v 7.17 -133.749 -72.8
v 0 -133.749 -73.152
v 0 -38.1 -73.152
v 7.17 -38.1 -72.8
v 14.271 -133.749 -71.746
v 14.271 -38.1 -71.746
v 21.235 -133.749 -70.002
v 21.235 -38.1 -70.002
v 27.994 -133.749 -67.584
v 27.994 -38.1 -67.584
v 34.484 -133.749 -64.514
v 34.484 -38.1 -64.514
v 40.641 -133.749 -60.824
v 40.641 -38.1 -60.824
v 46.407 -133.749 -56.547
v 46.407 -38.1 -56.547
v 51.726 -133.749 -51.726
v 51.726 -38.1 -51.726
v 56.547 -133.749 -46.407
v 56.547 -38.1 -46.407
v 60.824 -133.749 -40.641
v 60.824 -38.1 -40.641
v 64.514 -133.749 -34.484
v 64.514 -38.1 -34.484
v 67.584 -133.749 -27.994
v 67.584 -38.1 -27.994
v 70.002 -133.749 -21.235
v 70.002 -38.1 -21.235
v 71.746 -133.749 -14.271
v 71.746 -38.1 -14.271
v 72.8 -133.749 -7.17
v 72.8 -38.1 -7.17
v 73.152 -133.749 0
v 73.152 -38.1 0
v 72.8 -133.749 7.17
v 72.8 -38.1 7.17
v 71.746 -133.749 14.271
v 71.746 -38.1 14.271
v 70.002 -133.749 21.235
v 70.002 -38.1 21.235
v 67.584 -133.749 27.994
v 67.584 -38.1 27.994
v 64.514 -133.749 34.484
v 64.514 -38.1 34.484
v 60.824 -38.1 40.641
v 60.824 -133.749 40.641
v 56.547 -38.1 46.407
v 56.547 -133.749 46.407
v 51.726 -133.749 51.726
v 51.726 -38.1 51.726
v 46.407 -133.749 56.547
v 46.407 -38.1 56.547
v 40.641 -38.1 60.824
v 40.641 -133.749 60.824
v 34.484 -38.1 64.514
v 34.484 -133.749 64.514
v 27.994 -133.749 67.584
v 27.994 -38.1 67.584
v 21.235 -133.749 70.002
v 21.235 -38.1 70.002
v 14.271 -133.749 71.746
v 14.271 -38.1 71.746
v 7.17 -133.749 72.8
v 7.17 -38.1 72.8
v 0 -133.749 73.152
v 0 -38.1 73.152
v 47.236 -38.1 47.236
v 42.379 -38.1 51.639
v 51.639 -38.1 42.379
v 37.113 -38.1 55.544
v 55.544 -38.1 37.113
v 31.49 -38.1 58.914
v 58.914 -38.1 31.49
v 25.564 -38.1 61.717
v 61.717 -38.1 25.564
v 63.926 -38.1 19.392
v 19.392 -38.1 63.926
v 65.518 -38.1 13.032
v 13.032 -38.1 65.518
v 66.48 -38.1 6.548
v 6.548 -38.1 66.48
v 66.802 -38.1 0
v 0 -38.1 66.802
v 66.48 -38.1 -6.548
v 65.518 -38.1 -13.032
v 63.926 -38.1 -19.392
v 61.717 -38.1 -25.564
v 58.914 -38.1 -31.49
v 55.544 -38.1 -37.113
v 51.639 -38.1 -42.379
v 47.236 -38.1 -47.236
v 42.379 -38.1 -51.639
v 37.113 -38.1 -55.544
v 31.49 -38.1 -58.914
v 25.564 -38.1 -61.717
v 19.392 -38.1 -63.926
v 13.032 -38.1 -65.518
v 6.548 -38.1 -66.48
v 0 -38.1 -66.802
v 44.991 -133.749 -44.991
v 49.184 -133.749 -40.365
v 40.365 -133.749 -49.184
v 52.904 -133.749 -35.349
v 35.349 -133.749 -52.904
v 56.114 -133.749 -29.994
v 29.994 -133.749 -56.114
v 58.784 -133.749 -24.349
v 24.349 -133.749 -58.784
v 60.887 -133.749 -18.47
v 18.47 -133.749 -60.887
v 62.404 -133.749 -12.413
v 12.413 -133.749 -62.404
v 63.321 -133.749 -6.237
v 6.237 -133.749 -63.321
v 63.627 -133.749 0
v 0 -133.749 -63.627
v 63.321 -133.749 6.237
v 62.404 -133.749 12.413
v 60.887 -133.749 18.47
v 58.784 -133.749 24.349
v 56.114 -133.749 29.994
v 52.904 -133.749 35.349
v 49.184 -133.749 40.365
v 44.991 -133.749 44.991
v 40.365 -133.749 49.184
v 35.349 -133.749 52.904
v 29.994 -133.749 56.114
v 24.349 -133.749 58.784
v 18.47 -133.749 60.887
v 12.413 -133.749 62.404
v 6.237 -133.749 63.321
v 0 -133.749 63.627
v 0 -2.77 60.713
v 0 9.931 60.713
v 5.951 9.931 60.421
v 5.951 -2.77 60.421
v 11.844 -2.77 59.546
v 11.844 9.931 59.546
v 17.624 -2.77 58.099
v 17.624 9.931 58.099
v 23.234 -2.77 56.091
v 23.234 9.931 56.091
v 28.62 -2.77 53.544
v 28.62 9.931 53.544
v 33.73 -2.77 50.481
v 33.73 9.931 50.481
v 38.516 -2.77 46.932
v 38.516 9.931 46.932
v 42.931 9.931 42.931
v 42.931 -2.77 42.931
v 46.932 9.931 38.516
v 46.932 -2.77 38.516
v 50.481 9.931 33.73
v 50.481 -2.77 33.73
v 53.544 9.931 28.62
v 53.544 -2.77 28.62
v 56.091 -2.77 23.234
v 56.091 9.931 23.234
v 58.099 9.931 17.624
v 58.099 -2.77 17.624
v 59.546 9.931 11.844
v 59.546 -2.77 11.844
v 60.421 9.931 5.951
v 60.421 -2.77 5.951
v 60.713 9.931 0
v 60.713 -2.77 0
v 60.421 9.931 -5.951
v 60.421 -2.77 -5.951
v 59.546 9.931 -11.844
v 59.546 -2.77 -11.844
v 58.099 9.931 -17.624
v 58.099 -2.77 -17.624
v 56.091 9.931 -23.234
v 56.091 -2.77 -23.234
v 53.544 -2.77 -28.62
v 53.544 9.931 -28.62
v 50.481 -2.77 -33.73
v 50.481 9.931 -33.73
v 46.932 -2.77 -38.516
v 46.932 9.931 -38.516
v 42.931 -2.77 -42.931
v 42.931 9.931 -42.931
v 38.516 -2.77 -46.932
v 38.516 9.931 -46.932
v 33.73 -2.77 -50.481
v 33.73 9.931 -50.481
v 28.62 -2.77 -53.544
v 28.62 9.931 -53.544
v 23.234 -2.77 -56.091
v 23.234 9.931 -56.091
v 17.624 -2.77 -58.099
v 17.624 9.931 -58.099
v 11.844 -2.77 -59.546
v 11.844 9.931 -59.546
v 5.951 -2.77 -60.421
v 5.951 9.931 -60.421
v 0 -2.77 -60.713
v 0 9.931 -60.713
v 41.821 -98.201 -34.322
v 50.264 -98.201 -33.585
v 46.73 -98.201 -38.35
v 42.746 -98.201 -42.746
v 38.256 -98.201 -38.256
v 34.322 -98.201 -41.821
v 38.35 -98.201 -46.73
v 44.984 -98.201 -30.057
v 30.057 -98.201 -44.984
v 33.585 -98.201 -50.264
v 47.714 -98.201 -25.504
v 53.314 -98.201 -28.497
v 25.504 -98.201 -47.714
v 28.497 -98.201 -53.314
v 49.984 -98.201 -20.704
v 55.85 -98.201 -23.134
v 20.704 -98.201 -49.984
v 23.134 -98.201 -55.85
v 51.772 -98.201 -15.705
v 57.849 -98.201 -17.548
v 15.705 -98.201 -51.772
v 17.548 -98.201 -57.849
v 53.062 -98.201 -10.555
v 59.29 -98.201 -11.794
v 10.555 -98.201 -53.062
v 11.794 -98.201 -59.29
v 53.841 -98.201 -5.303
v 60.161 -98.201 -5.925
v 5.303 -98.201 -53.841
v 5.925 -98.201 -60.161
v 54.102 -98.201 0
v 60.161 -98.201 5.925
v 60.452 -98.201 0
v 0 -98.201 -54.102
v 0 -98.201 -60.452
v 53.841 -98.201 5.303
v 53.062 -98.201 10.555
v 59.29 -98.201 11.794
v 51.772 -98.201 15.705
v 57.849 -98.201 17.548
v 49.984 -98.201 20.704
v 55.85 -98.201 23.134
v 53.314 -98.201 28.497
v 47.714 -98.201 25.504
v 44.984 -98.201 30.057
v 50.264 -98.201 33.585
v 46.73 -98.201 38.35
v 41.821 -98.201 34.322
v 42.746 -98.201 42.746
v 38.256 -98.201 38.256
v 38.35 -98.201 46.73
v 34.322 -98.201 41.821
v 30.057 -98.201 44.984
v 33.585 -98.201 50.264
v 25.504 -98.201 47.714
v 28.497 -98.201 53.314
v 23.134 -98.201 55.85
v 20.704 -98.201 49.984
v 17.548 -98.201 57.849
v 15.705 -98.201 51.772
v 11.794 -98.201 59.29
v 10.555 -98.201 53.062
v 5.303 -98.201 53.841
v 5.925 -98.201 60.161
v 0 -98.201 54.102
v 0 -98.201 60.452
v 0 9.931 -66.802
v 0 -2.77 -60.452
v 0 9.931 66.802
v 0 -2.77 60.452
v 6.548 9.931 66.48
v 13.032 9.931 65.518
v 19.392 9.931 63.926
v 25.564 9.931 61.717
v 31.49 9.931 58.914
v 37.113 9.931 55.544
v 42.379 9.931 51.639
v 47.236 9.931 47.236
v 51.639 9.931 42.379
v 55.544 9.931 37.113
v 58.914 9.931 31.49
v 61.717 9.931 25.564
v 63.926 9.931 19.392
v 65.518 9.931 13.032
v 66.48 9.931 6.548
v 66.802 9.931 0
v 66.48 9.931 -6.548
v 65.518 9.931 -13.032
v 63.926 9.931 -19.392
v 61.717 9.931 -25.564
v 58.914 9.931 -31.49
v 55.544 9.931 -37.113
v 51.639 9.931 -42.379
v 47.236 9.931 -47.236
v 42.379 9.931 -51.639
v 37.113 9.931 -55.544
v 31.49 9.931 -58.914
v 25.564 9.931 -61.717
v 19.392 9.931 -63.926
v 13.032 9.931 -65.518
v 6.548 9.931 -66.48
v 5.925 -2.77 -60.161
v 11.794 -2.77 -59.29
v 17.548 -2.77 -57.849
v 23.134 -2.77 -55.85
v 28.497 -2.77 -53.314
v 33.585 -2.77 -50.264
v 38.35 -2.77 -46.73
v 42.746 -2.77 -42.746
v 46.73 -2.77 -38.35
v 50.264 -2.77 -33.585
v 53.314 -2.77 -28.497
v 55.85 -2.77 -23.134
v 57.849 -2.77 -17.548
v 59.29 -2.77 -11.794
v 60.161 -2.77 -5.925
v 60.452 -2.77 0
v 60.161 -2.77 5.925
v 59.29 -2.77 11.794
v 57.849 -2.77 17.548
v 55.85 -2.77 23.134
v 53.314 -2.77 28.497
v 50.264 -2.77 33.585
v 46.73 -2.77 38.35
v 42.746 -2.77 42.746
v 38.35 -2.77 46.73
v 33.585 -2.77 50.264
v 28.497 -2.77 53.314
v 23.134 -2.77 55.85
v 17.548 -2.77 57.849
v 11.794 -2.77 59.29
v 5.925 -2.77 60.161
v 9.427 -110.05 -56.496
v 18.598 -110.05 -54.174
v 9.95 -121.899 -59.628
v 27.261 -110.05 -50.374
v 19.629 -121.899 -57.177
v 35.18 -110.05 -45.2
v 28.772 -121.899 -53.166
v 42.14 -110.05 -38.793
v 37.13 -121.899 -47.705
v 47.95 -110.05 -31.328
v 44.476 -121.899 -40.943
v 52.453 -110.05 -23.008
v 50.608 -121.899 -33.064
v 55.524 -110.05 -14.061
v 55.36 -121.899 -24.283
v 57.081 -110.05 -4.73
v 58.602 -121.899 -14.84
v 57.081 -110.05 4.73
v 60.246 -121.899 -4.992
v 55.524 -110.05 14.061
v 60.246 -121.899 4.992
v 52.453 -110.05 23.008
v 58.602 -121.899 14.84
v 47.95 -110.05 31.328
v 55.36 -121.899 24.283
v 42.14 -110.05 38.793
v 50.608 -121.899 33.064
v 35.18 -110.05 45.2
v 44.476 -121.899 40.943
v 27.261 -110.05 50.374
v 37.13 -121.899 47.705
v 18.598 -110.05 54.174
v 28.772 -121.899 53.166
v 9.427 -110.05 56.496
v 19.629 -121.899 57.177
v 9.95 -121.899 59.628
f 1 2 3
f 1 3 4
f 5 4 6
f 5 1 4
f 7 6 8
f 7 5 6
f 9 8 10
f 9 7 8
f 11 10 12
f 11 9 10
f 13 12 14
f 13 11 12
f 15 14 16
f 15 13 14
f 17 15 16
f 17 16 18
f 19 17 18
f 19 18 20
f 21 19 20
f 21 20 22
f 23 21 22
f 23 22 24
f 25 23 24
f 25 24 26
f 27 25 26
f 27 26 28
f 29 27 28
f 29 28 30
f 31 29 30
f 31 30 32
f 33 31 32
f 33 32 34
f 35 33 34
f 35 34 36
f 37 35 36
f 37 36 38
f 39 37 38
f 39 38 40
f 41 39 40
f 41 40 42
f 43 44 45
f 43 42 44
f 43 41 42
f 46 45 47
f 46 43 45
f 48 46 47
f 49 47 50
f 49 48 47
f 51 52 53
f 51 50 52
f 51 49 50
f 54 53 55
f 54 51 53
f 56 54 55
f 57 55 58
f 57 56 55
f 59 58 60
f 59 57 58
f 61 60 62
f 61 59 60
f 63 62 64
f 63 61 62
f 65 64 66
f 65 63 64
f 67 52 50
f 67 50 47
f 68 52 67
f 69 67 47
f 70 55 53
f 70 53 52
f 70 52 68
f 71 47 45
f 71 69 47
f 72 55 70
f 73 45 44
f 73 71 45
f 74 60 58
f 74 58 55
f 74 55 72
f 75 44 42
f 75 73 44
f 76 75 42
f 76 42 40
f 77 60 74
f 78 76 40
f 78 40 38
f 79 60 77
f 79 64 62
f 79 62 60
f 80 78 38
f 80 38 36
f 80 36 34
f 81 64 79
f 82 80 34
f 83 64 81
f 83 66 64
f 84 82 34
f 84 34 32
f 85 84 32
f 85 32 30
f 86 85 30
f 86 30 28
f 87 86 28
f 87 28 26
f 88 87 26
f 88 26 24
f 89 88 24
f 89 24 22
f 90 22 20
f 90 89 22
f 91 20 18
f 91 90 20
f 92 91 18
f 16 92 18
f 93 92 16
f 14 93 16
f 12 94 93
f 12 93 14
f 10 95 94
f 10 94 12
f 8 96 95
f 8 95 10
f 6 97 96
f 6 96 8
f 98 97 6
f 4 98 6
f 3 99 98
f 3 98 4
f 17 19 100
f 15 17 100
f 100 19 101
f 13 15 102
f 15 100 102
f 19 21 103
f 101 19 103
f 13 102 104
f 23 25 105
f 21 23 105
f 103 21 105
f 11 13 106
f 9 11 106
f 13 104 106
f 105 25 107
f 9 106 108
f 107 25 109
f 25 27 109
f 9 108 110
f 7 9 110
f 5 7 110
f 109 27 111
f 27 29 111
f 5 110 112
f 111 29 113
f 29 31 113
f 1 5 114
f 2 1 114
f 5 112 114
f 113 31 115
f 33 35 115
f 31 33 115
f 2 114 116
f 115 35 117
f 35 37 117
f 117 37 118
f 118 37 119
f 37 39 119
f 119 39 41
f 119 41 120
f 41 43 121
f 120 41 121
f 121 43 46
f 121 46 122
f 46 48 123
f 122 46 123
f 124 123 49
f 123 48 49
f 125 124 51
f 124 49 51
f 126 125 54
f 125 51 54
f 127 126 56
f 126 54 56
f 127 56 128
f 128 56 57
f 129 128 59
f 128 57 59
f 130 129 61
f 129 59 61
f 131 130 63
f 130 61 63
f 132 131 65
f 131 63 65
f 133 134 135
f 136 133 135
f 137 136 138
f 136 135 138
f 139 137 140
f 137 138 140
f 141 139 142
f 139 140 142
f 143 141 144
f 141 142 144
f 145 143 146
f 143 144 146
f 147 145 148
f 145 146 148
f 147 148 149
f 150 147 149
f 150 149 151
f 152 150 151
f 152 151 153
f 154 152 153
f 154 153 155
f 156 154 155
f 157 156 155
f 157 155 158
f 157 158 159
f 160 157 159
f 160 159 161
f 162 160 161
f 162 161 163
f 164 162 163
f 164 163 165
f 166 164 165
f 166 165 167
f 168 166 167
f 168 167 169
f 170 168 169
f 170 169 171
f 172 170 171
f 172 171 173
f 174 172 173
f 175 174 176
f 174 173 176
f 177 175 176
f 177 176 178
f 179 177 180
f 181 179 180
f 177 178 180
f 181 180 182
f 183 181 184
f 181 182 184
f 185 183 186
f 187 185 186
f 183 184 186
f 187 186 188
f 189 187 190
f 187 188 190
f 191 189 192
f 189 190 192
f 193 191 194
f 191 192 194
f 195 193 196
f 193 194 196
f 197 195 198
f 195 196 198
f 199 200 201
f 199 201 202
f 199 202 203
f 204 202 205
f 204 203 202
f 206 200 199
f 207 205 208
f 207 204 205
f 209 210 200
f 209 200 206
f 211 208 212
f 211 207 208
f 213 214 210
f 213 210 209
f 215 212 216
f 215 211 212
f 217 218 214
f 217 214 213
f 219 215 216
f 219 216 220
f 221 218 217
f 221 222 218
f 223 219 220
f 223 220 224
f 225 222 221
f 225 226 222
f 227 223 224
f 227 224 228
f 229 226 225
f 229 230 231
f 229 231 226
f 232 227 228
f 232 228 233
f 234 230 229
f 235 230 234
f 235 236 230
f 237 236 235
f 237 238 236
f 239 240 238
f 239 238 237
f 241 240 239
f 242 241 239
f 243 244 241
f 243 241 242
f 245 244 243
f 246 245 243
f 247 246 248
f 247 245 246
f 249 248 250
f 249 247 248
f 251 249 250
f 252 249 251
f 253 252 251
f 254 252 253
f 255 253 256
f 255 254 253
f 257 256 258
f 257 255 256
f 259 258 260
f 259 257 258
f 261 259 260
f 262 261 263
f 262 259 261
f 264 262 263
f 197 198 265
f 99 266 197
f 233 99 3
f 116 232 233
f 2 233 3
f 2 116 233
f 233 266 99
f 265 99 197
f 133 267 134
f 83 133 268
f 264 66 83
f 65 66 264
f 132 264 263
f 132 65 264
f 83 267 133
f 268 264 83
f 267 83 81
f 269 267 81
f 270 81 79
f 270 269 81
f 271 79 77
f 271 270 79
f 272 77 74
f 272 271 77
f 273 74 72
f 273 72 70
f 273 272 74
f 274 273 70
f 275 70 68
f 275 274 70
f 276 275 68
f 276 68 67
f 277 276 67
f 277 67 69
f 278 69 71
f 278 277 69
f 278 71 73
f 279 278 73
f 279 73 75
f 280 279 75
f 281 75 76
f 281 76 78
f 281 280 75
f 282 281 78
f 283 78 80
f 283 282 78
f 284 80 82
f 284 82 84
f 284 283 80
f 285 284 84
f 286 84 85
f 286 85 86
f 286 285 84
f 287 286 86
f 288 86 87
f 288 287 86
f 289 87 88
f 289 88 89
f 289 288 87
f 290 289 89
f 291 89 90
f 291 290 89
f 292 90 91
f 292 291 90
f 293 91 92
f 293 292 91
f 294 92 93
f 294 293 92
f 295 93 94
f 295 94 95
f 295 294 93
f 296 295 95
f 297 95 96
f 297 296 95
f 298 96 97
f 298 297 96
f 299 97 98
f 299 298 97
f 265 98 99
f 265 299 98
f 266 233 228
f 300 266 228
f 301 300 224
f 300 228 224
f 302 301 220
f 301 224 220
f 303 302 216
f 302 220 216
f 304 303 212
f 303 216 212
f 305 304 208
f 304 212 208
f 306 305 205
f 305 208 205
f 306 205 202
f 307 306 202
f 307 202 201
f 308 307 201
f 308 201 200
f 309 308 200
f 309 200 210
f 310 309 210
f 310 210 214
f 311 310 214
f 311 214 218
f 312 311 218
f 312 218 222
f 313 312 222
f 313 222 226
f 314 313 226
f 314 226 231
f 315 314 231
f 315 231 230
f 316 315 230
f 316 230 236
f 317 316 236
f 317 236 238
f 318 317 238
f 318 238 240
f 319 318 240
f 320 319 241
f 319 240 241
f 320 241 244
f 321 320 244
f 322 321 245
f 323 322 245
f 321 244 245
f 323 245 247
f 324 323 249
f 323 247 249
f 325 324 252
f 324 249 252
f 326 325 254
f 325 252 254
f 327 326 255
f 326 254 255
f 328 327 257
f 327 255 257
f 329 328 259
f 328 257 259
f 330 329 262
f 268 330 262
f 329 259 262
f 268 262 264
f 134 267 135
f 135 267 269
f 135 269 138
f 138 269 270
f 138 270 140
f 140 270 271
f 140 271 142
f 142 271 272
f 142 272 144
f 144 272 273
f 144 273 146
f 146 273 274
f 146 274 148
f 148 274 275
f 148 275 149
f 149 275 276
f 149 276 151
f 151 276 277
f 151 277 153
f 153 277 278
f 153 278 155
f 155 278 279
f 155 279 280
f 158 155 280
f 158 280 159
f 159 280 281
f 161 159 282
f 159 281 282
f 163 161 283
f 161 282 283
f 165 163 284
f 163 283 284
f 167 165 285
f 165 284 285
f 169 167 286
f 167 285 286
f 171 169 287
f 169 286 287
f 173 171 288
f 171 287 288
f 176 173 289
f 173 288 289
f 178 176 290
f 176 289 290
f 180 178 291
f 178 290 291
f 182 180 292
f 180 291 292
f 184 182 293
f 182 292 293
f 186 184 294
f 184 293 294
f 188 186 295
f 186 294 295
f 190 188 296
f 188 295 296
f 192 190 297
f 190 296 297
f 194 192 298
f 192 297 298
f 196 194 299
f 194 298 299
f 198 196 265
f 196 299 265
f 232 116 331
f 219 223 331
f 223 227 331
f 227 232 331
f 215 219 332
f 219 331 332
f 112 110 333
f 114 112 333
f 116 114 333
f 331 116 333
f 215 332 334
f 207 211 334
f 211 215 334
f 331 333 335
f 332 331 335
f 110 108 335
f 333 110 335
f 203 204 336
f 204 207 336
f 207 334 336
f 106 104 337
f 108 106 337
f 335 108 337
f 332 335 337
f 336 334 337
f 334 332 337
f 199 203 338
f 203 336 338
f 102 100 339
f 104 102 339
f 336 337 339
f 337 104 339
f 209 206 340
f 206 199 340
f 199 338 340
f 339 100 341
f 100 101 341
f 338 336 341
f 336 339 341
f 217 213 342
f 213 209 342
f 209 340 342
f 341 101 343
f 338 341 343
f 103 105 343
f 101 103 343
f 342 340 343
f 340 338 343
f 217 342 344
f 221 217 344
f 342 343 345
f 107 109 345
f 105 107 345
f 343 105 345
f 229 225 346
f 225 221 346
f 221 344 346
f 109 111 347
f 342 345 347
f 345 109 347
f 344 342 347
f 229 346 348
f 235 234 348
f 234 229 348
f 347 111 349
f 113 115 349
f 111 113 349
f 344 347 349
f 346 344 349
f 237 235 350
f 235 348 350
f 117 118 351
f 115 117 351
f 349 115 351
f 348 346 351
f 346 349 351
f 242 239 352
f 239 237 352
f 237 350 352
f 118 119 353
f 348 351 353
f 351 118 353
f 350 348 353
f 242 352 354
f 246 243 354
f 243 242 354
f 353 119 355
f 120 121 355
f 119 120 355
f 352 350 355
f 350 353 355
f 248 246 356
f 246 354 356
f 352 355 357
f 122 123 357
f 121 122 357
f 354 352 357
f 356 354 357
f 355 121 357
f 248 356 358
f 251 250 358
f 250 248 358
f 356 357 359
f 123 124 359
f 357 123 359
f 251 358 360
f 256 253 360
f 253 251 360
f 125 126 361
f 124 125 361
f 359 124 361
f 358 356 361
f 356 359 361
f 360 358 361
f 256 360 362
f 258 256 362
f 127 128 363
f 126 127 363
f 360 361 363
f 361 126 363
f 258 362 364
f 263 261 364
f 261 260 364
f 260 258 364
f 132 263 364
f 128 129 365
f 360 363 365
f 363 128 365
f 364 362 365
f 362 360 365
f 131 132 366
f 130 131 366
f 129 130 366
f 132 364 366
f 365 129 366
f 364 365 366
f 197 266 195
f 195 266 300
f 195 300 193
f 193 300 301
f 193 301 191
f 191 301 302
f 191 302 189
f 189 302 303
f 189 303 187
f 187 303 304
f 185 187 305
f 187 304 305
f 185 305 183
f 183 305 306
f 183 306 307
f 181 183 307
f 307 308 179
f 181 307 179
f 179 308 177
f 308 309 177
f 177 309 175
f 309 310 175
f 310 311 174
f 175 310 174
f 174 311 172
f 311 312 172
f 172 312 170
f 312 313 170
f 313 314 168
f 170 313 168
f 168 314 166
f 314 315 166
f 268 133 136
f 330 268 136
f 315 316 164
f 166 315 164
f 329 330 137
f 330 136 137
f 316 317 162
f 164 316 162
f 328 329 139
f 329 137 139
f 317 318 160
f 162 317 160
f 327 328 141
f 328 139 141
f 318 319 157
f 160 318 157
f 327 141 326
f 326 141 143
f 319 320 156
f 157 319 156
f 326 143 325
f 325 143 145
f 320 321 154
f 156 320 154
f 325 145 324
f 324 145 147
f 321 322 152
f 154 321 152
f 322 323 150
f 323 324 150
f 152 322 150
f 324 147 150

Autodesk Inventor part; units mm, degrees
ref_plane "YZ Plane" through (0, 0, 0) normal (1, 0, 0) x (0, 1, 0)
ref_plane "XZ Plane" through (0, 0, 0) normal (0, 1, 0) x (-1, 0, 0)
ref_plane "XY Plane" through (0, 0, 0) normal (0, 0, 1) x (1, 0, 0)
sketch "Sketch1" plane through (0, 0, 0) normal (0, 0, 1) x (1, 0, 0)
  line L0 (0, 25.4) -> (-28.702, 25.4) construction
  line L1 (0, 25.4) -> (-86.36, 25.4) construction
  line L2 (-86.36, 25.4) -> (-80.01, 25.4) construction
  line L3 (-80.01, 25.4) -> (-73.66, 22.4389) construction
  line L4 (-80.01, 25.4) -> (-80.01, 22.4389) construction
  line L5 (-80.01, 0) -> (-86.36, 0)
  line L6 (-28.702, 59.6457) -> (-28.702, -91.9304) construction
  arc A0 (-28.9184, -4.2142) -> (-32.3684, 3.1843) centre (-35.052, -2.5707) ccw
  line L7 (-67.31, -147.4937) -> (-28.9184, -4.2142)
  line L8 (-80.01, 22.4389) -> (-73.66, 22.4389)
  line L9 (-80.01, 22.4389) -> (-80.01, 0)
  line L10 (-73.66, 22.4389) -> (-32.3684, 3.1843)
  line L11 (-28.702, -2.5707) -> (-60.452, -2.5707) construction
  line L12 (-60.452, 16.28) -> (-60.452, -121.8993) construction
  line L13 (-60.452, -121.8993) -> (-54.102, -121.8993) construction
  line L14 (-54.102, -121.8993) -> (-54.102, -98.2008) construction
  line L15 (-54.102, -98.2008) -> (-60.452, -98.2008)
  line L16 (-60.452, 16.28) -> (-60.452, 6.755) construction
  line L17 (-60.452, 16.28) -> (-60.452, 9.93) construction
  line L18 (-60.452, 9.93) -> (-46.8344, 9.93)
  line L19 (-60.452, 9.93) -> (-60.452, -98.2008)
  line L20 (-86.36, 0) -> (-86.36, -12.7) construction
  line L21 (-60.452, -12.7) -> (-73.152, -12.7) construction
  line L22 (-86.36, -12.7) -> (-86.36, -25.4) construction
  line L23 (-86.36, -25.4) -> (-86.36, -88.9) construction
  line L24 (-86.36, -88.9) -> (-73.66, -88.9) construction
  line L25 (-73.66, -88.9) -> (-73.66, -25.4) construction
  line L26 (-86.36, -25.4) -> (-73.66, -25.4)
  line L27 (-73.66, -25.4) -> (-73.66, -88.9)
  line L28 (-73.66, -88.9) -> (-86.36, -88.9)
  line L29 (-86.36, -12.7) -> (-73.152, -12.7)
  line L30 (-73.152, -133.7486) -> (-63.627, -133.7486)
  line L31 (-73.66, -88.9) -> (-73.66, -147.4937)
  line L32 (-73.66, -147.4937) -> (-67.31, -147.4937)
  line L33 (-73.152, -12.7) -> (-73.152, -133.7486)
  line L34 (-80.01, -25.4) -> (-80.01, -31.3436)
  line L35 (-80.01, -31.3436) -> (-86.36, -31.3436)
  line L36 (-86.36, 0) -> (-86.36, -25.4)
  line L37 (-86.36, -31.3436) -> (-86.36, -88.9)
  line L38 (0, -319.0244) -> (0, 122.7573) projected
  point P0 (0, 0)
  point P1 (-86.36, -255.9127)
  point P2 (-76.835, 22.4389)
  dimension "d0" = 28.702
  dimension "d1" = 86.36
  dimension "d2" = 6.35
  dimension "d3" = 25
  dimension "d5" = 25.4
  dimension "d6" = 25.4
  dimension "d8" = 12.7
  dimension "d11" = 6.35
  dimension "d12" = 31.75
  dimension "d13" = 6.35
  dimension "d15" = 6.35
  dimension "d16" = 12.7
  dimension "d17" = 12.7
  dimension "d18" = 12.7
  dimension "d19" = 63.5
  dimension "d20" = 12.7
  dimension "d22" = 9.525
  dimension "d23" = 6.35
  dimension "d25" = 5.9436
  dimension "d26" = 15
revolve "Revolution2" add sketch "Sketch1" angle 360 about axis through (0, -10, 0) along (0, 1, 0) contours L9 L8 L10 L18 L19 L15 L7 L30 L33 L29 L36 L5
sketch "Sketch2" plane through (0, 0, 0) normal (0, 1, 0) x (-1, 0, 0)
  line L0 (0, -114.5678) -> (107.9834, -114.5678)
  line L1 (107.9834, -114.5678) -> (107.9834, 108.3126)
  line L2 (107.9834, 108.3126) -> (0, 108.3126)
  line L3 (0, 108.3126) -> (0, -114.5678)
  point P0 (0, 0)
extrude "Extrusion1" cut sketch "Sketch2" along normal through all both and the other way through all
sketch "Sketch6" plane through (0, -133.7486, -73.152) normal (-1, 0, 0) x (0, 0, 1)
  line L0 (0, 121.0486) -> (0, 95.6486)
  line L1 (0, 95.6486) -> (6.35, 95.6486)
  line L2 (0, 121.0486) -> (-13.208, 121.0486)
  line L3 (-13.208, 121.0486) -> (-13.208, 133.7486) projected
  line L4 (-13.208, 121.0486) -> (-13.208, 133.7486)
  line L5 (-13.208, 133.7486) -> (-6.858, 133.7486)
  line L6 (-6.858, 133.7486) -> (-6.858, 156.1875)
  line L7 (-0.508, 156.1875) -> (26.3176, 143.6785) projected
  line L8 (-6.858, 156.1875) -> (-0.508, 156.1875)
  line L9 (-0.508, 156.1875) -> (26.3176, 143.6785)
  line L10 (6.35, 95.6486) -> (6.35, 143.68)
  line L11 (6.35, 143.68) -> (26.3176, 143.6785)
  line L12 (26.3176, 143.6785) -> (92.5608, 143.6785) construction
  line L13 (73.152, 133.7486) -> (73.152, 183.9478) construction
  line L14 (119.9864, 143.6785) -> (26.3176, 143.6785) construction
  line L15 (26.3176, 143.6785) -> (73.152, 143.6785) construction
  dimension "d37" = 25.4
  dimension "d38" = 6.35
  dimension "d39" = 6.35
  dimension "d40" = 48.0314
revolve "Revolution4" cut sketch "Sketch6" angle 360 about axis through (0, 0, 0) along (0, 1, 0)
sketch "Sketch7" plane through (0, 9.93, 0) normal (0, -1, 0) x (1, 0, 0)
  point P0 (0, 0)
sketch "Sketch8" plane through (0, 9.93, 0) normal (0, -1, 0) x (1, 0, 0)
  point P0 (0, 0)
sketch "Sketch9" plane through (0, 9.93, 0) normal (0, -1, 0) x (1, 0, 0)
  circle A0 centre (0, 0) radius 60.7129
extrude "Extrusion2" cut sketch "Sketch9" along normal mid plane 25.4
properties part number "part 1 phenolic sketch" material "Phenolic Resin"
